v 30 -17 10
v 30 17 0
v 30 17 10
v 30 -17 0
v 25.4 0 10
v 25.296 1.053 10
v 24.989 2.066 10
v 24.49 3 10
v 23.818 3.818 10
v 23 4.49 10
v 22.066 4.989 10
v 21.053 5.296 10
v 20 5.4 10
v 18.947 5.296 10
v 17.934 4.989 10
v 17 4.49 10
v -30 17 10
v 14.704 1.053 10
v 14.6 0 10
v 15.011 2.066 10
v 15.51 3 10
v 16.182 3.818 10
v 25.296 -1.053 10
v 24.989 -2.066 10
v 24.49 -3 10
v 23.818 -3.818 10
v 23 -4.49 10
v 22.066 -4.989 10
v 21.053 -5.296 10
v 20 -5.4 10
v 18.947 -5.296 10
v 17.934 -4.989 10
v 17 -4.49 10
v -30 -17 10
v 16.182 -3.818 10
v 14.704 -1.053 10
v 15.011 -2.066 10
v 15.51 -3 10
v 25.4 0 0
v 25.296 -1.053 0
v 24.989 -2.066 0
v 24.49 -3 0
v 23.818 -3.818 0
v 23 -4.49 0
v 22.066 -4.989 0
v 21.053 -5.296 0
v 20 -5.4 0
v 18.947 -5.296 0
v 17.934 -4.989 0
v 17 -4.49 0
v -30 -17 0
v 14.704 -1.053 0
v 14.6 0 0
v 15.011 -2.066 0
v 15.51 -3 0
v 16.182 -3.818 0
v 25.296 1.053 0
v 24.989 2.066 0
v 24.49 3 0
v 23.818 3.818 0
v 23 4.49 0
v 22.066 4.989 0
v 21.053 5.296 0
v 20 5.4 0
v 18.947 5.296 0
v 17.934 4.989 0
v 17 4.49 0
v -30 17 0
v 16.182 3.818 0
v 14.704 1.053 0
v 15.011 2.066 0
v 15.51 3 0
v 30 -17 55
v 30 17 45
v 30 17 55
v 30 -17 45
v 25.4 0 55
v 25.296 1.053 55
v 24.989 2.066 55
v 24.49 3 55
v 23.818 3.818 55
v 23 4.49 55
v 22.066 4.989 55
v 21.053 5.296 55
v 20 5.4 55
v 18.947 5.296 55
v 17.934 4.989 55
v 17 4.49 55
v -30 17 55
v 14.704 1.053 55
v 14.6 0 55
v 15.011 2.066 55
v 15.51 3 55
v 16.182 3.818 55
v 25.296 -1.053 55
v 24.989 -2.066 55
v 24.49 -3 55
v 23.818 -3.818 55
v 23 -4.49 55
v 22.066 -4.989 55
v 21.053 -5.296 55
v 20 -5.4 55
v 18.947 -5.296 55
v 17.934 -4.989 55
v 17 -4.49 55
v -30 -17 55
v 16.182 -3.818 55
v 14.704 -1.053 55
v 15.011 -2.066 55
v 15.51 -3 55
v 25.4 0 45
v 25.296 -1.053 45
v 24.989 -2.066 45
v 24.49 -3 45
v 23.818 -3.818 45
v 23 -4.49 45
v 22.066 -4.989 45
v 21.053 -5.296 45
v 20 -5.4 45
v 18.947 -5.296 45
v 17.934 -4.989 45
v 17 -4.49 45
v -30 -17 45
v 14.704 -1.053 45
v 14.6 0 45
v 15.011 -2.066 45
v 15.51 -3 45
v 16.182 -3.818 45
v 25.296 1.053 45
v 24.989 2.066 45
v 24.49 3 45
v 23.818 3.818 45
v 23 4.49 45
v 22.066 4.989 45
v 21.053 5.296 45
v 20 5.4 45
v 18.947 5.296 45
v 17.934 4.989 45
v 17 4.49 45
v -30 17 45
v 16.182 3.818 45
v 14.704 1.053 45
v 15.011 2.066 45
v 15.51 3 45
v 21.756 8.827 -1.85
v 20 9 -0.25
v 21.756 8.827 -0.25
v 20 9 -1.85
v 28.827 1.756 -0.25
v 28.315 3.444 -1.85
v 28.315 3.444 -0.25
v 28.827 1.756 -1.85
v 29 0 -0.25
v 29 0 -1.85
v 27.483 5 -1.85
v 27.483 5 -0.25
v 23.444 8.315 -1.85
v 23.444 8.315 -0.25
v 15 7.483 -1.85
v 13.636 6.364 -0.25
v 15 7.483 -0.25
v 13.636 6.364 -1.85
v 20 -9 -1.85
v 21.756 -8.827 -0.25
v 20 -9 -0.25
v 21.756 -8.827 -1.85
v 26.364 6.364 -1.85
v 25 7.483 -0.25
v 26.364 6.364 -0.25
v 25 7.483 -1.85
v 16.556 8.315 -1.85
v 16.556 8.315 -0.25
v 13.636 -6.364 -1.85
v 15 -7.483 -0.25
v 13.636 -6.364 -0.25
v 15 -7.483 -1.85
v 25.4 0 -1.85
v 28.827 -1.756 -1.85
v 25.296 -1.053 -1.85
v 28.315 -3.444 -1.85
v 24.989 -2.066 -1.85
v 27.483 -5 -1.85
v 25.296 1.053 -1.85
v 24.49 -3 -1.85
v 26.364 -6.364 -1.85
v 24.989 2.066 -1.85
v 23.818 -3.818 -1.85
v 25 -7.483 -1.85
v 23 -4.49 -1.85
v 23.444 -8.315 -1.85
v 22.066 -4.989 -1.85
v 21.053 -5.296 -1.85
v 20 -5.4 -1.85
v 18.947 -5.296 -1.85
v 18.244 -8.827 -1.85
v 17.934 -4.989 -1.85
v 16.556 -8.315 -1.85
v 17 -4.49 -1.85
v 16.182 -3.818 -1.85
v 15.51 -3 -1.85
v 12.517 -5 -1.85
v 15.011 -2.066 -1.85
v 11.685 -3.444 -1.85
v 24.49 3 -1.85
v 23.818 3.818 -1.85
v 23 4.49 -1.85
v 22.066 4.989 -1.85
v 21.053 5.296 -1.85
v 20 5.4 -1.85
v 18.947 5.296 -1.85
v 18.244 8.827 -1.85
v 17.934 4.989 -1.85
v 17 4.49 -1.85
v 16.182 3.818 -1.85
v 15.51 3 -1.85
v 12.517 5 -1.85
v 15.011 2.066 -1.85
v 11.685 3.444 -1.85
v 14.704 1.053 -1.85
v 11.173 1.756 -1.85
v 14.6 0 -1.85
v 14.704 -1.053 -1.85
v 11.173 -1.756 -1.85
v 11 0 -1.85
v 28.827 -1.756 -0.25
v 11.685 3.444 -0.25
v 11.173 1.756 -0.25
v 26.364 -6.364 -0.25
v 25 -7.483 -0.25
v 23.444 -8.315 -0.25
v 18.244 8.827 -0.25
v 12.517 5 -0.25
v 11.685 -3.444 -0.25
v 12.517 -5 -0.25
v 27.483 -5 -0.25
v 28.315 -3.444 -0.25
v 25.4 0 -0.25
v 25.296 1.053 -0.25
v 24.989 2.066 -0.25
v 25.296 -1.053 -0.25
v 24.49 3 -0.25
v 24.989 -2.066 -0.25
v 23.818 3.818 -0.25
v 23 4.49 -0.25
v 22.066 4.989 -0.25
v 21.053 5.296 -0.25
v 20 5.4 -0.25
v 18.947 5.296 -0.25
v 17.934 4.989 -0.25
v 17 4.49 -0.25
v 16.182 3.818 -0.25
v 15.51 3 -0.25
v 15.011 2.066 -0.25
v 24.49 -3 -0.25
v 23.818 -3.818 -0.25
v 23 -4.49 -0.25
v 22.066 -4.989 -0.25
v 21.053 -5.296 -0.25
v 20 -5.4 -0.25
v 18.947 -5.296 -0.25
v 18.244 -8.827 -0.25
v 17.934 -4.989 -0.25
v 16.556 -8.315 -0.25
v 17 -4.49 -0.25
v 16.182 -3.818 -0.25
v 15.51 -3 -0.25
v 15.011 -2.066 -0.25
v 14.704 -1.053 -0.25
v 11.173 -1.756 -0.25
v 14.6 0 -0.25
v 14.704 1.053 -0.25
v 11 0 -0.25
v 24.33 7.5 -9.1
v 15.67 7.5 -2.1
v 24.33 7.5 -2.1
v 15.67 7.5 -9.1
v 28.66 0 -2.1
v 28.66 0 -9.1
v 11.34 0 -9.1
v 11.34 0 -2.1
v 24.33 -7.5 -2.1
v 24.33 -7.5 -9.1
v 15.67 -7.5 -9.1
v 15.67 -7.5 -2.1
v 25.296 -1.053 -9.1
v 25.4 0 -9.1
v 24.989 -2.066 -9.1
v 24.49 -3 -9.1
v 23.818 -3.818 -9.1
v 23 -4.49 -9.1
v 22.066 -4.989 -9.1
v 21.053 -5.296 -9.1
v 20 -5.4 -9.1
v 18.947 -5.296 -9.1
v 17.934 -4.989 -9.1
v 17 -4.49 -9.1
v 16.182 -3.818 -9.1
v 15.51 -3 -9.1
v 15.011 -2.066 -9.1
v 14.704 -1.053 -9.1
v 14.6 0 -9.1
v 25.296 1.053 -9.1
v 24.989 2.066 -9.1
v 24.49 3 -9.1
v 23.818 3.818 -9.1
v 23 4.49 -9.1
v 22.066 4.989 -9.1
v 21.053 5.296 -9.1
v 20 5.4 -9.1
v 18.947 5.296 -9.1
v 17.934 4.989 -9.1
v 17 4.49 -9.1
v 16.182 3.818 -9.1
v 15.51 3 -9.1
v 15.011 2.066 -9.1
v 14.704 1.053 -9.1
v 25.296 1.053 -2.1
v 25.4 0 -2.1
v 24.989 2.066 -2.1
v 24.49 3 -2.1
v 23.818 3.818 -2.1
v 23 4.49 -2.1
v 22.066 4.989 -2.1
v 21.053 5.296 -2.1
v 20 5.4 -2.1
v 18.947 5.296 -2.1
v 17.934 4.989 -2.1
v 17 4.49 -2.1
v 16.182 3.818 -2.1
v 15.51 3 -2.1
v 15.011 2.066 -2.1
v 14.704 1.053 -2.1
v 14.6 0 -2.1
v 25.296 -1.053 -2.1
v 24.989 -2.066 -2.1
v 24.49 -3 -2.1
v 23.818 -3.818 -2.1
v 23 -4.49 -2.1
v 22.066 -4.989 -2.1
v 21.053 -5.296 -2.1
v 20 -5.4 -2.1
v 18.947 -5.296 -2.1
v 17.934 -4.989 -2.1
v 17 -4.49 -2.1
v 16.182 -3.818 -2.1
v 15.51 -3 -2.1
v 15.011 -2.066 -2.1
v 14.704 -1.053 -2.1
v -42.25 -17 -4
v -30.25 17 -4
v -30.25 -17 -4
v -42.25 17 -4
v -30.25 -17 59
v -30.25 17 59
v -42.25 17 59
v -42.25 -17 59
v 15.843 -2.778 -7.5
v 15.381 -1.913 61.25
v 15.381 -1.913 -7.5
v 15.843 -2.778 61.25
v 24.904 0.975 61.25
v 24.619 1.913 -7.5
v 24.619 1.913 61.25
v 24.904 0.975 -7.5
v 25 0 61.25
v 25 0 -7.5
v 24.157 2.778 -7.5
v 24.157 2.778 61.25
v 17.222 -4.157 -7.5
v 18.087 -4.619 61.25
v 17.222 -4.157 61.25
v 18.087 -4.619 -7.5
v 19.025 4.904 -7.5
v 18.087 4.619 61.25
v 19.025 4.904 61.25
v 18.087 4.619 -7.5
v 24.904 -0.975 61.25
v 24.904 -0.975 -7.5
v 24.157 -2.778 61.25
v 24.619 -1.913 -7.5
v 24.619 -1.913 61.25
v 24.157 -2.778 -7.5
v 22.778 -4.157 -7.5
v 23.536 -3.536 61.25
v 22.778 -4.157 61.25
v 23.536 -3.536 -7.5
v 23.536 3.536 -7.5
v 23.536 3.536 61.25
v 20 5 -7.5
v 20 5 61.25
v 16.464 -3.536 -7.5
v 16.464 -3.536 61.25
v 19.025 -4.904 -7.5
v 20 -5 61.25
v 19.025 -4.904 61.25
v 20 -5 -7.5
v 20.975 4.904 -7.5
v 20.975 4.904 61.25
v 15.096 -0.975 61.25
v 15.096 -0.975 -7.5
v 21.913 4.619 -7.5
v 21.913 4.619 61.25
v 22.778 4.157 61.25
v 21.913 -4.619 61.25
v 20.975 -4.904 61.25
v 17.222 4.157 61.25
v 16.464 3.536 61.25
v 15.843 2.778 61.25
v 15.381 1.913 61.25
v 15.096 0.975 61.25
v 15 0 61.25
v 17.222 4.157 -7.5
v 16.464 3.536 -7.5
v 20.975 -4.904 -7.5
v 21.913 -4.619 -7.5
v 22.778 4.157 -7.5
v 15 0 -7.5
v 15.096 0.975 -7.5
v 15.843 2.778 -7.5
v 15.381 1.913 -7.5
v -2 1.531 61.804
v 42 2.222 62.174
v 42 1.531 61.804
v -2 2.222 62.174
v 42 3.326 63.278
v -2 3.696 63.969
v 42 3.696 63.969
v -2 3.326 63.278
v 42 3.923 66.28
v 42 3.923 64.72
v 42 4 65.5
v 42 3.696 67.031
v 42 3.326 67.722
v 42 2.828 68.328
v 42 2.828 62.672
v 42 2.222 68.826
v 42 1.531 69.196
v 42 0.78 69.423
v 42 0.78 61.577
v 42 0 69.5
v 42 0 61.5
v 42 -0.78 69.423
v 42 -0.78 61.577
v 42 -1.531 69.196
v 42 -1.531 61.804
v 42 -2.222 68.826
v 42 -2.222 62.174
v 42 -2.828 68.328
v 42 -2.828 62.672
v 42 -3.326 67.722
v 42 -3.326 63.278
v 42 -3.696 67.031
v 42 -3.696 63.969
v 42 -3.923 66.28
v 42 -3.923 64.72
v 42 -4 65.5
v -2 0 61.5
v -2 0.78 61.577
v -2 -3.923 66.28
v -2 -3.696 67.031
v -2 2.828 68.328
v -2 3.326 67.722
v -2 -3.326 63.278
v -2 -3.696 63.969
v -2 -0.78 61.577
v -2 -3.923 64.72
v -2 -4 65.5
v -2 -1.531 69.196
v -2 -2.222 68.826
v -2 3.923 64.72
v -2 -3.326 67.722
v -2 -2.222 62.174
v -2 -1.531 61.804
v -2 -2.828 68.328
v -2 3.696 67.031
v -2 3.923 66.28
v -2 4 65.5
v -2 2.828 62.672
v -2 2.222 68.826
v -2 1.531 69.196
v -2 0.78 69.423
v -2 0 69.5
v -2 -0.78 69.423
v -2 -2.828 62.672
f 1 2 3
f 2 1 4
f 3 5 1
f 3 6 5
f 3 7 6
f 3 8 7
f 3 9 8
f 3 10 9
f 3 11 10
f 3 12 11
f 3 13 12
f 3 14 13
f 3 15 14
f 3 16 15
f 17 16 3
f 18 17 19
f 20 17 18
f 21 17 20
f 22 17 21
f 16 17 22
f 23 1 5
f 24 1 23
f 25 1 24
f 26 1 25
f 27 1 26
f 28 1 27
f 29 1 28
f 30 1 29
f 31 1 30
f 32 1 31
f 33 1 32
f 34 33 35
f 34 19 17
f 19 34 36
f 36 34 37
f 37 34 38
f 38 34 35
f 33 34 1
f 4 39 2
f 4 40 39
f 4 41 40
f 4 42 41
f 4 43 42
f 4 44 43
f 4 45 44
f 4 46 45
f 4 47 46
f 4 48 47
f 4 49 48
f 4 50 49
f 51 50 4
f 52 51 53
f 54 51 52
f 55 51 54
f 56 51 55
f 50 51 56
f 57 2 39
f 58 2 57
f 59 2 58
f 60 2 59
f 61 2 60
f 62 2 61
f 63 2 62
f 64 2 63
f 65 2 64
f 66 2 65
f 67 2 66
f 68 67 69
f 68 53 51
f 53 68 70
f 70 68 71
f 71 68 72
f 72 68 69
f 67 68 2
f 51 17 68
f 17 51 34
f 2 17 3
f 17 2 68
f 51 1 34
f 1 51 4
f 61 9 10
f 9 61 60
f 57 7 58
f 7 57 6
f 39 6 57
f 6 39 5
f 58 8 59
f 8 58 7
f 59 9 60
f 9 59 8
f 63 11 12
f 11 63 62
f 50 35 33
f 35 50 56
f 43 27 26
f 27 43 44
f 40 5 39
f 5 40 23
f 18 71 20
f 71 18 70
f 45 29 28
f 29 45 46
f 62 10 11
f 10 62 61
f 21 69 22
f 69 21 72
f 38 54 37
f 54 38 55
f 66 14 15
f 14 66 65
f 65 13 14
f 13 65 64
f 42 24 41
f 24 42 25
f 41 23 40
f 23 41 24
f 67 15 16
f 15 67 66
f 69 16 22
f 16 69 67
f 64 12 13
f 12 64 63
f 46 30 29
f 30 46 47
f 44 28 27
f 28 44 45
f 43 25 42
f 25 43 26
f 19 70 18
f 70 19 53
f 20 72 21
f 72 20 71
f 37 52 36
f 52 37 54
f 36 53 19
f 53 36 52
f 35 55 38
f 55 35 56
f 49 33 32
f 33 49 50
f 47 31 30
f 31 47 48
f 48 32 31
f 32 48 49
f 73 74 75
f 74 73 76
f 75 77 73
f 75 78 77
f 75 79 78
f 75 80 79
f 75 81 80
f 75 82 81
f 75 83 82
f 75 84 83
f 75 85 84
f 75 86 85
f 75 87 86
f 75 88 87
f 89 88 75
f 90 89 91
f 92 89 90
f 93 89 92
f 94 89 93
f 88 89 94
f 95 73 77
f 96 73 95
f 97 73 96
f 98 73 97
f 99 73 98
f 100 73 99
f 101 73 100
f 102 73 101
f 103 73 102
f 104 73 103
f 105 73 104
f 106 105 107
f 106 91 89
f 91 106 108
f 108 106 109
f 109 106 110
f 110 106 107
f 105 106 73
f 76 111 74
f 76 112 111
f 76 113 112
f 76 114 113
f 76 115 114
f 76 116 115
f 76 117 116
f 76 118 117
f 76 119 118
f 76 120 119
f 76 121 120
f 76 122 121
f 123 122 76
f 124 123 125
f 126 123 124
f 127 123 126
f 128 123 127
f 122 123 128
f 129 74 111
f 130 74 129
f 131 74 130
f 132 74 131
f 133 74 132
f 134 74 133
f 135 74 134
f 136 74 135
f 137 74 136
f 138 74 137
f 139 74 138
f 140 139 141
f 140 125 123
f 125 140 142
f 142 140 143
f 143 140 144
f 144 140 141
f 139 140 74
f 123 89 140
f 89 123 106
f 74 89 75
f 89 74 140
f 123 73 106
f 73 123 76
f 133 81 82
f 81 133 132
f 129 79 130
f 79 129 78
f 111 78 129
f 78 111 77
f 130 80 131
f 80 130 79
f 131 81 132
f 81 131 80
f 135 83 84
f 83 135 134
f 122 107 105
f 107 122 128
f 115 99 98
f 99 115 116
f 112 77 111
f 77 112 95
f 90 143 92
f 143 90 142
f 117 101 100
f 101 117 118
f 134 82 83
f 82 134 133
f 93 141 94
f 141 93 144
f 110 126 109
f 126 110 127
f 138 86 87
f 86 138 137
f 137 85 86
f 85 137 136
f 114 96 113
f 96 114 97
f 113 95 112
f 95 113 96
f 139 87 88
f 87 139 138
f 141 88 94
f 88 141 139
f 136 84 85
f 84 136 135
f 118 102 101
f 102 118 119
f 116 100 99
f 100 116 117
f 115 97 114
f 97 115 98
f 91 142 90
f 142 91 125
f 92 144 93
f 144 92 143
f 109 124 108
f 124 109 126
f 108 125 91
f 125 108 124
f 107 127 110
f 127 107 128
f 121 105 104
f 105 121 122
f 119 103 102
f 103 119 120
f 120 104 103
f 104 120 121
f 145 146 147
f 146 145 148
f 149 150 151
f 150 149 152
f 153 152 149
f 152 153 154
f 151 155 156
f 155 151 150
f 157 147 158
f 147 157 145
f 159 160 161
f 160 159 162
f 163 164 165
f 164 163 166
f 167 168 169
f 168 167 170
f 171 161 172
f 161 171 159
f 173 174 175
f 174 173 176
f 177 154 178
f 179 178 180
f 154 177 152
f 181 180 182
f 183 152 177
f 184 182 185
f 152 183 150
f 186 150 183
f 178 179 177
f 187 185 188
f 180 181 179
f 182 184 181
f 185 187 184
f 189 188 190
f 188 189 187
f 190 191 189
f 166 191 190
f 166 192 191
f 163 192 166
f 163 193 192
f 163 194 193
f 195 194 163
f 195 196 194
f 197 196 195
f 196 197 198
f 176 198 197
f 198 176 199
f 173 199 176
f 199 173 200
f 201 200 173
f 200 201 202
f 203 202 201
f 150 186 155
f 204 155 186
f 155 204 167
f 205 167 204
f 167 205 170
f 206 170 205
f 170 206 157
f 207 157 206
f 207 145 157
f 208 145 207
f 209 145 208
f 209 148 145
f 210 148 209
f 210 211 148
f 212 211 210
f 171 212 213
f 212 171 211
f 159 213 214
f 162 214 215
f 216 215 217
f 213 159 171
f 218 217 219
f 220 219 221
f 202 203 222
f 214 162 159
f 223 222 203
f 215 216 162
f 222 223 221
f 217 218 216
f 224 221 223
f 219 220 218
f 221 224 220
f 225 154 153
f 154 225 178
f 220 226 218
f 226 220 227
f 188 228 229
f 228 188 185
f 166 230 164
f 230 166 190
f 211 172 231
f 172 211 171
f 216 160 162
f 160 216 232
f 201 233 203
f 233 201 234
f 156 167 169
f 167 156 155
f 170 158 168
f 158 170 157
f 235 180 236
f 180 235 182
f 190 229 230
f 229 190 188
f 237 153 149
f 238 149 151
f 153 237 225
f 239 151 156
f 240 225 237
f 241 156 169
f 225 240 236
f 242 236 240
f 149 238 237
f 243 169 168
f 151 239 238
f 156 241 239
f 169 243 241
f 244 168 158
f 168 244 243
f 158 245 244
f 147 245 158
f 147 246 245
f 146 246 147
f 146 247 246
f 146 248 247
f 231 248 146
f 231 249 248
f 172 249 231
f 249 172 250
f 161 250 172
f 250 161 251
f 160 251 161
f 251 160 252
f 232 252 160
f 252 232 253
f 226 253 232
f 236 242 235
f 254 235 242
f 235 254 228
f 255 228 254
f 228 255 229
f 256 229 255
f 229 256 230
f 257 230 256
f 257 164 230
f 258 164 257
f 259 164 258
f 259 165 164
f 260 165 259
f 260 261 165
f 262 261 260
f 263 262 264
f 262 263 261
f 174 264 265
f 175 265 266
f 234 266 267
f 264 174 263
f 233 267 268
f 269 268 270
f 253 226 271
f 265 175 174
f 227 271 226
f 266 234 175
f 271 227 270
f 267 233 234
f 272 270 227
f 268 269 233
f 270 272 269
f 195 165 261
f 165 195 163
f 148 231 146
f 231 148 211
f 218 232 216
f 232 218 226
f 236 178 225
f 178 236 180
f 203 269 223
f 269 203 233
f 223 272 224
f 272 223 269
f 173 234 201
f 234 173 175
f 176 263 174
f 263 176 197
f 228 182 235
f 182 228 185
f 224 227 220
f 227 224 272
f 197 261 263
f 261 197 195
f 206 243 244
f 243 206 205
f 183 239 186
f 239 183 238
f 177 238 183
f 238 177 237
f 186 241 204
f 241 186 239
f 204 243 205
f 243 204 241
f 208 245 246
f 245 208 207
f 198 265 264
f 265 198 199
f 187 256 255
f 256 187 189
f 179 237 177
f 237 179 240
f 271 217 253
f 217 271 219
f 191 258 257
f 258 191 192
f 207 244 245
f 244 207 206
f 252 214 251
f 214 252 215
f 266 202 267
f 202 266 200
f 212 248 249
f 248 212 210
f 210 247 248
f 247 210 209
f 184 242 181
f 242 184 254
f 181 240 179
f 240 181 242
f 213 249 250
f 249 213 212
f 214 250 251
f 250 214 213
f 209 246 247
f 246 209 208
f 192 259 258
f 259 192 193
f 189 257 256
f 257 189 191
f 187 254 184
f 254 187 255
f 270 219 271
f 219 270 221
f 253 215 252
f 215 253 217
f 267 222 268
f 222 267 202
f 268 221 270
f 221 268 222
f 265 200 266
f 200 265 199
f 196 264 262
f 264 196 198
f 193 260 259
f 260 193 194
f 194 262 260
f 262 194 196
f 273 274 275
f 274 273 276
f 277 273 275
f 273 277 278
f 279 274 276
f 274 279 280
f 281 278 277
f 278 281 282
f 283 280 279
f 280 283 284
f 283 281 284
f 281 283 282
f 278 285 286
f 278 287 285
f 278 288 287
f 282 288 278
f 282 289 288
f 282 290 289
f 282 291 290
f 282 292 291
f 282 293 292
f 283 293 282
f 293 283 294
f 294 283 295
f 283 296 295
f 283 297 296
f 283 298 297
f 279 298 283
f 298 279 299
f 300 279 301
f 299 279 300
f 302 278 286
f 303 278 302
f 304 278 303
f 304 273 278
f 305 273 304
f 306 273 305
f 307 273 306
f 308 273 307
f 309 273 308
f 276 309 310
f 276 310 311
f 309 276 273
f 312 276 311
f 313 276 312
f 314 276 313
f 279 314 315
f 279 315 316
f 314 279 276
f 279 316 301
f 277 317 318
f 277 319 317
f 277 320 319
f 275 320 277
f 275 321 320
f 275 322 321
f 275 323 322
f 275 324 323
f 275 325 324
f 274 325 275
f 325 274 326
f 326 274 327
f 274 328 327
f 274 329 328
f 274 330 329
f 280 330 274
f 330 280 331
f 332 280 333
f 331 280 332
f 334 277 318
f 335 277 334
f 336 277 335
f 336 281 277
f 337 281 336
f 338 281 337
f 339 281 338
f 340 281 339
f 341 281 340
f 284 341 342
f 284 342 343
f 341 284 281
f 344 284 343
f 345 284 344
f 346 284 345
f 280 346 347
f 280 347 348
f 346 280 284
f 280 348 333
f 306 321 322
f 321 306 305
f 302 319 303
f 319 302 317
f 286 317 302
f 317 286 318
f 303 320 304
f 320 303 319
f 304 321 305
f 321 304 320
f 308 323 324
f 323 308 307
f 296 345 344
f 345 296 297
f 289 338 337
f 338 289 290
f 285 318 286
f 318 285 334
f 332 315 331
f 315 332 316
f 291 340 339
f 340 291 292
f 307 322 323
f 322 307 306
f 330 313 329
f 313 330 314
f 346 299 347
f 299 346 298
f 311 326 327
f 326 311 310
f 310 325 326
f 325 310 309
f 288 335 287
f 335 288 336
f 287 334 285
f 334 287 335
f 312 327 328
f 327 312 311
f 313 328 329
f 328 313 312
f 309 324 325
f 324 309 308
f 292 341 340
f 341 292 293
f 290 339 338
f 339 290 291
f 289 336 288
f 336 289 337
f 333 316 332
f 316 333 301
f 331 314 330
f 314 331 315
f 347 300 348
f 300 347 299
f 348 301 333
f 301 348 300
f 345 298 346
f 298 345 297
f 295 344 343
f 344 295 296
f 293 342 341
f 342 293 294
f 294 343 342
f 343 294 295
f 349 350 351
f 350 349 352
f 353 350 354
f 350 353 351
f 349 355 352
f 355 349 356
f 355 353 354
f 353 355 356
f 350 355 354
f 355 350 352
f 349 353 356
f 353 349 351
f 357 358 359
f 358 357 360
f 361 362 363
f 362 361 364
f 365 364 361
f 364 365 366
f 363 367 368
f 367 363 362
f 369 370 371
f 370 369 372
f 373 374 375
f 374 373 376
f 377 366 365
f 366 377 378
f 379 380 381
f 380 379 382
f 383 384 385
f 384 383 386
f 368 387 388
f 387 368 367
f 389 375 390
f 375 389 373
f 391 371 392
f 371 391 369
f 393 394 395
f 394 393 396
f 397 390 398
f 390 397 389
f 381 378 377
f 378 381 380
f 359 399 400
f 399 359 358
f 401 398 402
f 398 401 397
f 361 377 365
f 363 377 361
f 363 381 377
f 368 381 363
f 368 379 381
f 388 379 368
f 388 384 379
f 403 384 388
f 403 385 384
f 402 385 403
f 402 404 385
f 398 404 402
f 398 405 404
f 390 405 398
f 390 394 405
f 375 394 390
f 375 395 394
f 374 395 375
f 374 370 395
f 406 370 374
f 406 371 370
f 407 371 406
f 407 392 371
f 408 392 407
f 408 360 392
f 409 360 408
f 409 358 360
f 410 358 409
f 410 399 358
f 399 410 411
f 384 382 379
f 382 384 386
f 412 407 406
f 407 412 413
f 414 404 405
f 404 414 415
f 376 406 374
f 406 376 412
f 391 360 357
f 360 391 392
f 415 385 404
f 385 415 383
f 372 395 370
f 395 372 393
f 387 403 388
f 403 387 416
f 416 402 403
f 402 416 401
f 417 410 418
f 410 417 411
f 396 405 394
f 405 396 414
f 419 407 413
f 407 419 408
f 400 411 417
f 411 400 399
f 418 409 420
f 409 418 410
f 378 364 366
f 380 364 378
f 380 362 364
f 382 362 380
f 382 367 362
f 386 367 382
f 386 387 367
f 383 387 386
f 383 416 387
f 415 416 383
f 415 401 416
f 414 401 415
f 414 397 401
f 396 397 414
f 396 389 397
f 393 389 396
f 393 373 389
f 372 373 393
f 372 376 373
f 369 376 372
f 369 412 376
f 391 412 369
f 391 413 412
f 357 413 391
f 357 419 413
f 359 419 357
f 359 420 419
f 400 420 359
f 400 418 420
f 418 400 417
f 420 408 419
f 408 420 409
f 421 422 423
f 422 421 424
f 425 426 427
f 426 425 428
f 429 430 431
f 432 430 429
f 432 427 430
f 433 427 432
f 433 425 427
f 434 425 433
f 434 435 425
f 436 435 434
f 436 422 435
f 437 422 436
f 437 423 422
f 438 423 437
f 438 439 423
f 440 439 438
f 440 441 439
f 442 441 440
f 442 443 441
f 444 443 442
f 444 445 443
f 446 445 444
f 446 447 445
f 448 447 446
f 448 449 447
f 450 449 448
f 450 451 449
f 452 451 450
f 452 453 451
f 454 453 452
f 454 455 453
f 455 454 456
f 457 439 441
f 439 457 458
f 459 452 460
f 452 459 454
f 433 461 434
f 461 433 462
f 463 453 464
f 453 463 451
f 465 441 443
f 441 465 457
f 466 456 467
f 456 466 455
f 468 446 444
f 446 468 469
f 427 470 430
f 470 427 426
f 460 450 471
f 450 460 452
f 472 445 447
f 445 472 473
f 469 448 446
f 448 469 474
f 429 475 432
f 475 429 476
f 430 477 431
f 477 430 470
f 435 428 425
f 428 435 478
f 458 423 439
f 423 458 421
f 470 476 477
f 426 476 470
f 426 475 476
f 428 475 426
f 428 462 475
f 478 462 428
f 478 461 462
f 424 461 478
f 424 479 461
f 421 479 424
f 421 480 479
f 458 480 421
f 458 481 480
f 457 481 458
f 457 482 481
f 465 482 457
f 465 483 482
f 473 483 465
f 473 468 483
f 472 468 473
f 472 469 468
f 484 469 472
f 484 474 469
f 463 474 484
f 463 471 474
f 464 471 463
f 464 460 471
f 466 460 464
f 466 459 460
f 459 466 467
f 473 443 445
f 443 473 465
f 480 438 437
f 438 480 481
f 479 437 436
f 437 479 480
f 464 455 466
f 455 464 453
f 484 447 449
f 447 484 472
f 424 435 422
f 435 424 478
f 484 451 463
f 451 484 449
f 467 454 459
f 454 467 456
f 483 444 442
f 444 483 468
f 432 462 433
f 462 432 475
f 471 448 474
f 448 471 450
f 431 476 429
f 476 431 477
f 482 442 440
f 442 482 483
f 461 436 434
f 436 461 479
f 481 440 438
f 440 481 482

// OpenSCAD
$fn = 32;

// ------------------------------------------------------------------------
// C clamp: throat 45 mm, screw d10
// Every part is its own module, assembly() places every instance.
// ------------------------------------------------------------------------

// --- part 1 ---
module clamp_arm() {
  difference() {
    translate([-30, -17, 0]) cube([60, 34, 10]);
    translate([20, 0, -1]) cylinder(h = 12, d = 10.8);
  }
}

// --- part 2 ---
module clamp_spine() {
  difference() {
    translate([-31.5, -17, 0]) cube([63, 34, 12]);
  }
}

// --- part 3 ---
module clamp_screw() {
  translate([0, 0, -34.375]) cylinder(h = 68.75, d = 10);
}

// --- part 4 ---
module clamp_washer() {
  difference() {
      translate([0, 0, 0]) cylinder(h = 1.6, d = 18);
      translate([0, 0, -1]) cylinder(h = 3.6, d = 10.8);
    }
}

// --- part 5 ---
module clamp_nut() {
  difference() {
    linear_extrude(height = 7) polygon(points = [[8.66, 0], [4.33, 7.5], [-4.33, 7.5], [-8.66, 0], [-4.33, -7.5], [4.33, -7.5]]);
    translate([0, 0, -1]) cylinder(h = 9, d = 10.8);
  }
}

// --- part 6 ---
module tommy_bar() {
  translate([0, 0, -22]) cylinder(h = 44, d = 8);
}

// --- assembly ---
module assembly() {
  color([0.80, 0.24, 0.20]) translate([0, 0, 0]) rotate([0, 0, 0]) clamp_arm();
  color([0.20, 0.45, 0.75]) translate([0, 0, 45]) rotate([0, 0, 0]) clamp_arm();
  color([0.25, 0.62, 0.32]) translate([-42.25, 0, 27.5]) rotate([0, 90, 0]) clamp_spine();
  color([0.92, 0.70, 0.18]) translate([20, 0, 26.875]) rotate([0, 0, 0]) clamp_screw();
  color([0.58, 0.35, 0.70]) translate([20, 0, -1.85]) rotate([0, 0, 0]) clamp_washer();
  color([0.16, 0.66, 0.66]) translate([20, 0, -9.1]) rotate([0, 0, 0]) clamp_nut();
  color([0.85, 0.48, 0.18]) translate([20, 0, 65.5]) rotate([0, 90, 0]) tommy_bar();
}

assembly();
